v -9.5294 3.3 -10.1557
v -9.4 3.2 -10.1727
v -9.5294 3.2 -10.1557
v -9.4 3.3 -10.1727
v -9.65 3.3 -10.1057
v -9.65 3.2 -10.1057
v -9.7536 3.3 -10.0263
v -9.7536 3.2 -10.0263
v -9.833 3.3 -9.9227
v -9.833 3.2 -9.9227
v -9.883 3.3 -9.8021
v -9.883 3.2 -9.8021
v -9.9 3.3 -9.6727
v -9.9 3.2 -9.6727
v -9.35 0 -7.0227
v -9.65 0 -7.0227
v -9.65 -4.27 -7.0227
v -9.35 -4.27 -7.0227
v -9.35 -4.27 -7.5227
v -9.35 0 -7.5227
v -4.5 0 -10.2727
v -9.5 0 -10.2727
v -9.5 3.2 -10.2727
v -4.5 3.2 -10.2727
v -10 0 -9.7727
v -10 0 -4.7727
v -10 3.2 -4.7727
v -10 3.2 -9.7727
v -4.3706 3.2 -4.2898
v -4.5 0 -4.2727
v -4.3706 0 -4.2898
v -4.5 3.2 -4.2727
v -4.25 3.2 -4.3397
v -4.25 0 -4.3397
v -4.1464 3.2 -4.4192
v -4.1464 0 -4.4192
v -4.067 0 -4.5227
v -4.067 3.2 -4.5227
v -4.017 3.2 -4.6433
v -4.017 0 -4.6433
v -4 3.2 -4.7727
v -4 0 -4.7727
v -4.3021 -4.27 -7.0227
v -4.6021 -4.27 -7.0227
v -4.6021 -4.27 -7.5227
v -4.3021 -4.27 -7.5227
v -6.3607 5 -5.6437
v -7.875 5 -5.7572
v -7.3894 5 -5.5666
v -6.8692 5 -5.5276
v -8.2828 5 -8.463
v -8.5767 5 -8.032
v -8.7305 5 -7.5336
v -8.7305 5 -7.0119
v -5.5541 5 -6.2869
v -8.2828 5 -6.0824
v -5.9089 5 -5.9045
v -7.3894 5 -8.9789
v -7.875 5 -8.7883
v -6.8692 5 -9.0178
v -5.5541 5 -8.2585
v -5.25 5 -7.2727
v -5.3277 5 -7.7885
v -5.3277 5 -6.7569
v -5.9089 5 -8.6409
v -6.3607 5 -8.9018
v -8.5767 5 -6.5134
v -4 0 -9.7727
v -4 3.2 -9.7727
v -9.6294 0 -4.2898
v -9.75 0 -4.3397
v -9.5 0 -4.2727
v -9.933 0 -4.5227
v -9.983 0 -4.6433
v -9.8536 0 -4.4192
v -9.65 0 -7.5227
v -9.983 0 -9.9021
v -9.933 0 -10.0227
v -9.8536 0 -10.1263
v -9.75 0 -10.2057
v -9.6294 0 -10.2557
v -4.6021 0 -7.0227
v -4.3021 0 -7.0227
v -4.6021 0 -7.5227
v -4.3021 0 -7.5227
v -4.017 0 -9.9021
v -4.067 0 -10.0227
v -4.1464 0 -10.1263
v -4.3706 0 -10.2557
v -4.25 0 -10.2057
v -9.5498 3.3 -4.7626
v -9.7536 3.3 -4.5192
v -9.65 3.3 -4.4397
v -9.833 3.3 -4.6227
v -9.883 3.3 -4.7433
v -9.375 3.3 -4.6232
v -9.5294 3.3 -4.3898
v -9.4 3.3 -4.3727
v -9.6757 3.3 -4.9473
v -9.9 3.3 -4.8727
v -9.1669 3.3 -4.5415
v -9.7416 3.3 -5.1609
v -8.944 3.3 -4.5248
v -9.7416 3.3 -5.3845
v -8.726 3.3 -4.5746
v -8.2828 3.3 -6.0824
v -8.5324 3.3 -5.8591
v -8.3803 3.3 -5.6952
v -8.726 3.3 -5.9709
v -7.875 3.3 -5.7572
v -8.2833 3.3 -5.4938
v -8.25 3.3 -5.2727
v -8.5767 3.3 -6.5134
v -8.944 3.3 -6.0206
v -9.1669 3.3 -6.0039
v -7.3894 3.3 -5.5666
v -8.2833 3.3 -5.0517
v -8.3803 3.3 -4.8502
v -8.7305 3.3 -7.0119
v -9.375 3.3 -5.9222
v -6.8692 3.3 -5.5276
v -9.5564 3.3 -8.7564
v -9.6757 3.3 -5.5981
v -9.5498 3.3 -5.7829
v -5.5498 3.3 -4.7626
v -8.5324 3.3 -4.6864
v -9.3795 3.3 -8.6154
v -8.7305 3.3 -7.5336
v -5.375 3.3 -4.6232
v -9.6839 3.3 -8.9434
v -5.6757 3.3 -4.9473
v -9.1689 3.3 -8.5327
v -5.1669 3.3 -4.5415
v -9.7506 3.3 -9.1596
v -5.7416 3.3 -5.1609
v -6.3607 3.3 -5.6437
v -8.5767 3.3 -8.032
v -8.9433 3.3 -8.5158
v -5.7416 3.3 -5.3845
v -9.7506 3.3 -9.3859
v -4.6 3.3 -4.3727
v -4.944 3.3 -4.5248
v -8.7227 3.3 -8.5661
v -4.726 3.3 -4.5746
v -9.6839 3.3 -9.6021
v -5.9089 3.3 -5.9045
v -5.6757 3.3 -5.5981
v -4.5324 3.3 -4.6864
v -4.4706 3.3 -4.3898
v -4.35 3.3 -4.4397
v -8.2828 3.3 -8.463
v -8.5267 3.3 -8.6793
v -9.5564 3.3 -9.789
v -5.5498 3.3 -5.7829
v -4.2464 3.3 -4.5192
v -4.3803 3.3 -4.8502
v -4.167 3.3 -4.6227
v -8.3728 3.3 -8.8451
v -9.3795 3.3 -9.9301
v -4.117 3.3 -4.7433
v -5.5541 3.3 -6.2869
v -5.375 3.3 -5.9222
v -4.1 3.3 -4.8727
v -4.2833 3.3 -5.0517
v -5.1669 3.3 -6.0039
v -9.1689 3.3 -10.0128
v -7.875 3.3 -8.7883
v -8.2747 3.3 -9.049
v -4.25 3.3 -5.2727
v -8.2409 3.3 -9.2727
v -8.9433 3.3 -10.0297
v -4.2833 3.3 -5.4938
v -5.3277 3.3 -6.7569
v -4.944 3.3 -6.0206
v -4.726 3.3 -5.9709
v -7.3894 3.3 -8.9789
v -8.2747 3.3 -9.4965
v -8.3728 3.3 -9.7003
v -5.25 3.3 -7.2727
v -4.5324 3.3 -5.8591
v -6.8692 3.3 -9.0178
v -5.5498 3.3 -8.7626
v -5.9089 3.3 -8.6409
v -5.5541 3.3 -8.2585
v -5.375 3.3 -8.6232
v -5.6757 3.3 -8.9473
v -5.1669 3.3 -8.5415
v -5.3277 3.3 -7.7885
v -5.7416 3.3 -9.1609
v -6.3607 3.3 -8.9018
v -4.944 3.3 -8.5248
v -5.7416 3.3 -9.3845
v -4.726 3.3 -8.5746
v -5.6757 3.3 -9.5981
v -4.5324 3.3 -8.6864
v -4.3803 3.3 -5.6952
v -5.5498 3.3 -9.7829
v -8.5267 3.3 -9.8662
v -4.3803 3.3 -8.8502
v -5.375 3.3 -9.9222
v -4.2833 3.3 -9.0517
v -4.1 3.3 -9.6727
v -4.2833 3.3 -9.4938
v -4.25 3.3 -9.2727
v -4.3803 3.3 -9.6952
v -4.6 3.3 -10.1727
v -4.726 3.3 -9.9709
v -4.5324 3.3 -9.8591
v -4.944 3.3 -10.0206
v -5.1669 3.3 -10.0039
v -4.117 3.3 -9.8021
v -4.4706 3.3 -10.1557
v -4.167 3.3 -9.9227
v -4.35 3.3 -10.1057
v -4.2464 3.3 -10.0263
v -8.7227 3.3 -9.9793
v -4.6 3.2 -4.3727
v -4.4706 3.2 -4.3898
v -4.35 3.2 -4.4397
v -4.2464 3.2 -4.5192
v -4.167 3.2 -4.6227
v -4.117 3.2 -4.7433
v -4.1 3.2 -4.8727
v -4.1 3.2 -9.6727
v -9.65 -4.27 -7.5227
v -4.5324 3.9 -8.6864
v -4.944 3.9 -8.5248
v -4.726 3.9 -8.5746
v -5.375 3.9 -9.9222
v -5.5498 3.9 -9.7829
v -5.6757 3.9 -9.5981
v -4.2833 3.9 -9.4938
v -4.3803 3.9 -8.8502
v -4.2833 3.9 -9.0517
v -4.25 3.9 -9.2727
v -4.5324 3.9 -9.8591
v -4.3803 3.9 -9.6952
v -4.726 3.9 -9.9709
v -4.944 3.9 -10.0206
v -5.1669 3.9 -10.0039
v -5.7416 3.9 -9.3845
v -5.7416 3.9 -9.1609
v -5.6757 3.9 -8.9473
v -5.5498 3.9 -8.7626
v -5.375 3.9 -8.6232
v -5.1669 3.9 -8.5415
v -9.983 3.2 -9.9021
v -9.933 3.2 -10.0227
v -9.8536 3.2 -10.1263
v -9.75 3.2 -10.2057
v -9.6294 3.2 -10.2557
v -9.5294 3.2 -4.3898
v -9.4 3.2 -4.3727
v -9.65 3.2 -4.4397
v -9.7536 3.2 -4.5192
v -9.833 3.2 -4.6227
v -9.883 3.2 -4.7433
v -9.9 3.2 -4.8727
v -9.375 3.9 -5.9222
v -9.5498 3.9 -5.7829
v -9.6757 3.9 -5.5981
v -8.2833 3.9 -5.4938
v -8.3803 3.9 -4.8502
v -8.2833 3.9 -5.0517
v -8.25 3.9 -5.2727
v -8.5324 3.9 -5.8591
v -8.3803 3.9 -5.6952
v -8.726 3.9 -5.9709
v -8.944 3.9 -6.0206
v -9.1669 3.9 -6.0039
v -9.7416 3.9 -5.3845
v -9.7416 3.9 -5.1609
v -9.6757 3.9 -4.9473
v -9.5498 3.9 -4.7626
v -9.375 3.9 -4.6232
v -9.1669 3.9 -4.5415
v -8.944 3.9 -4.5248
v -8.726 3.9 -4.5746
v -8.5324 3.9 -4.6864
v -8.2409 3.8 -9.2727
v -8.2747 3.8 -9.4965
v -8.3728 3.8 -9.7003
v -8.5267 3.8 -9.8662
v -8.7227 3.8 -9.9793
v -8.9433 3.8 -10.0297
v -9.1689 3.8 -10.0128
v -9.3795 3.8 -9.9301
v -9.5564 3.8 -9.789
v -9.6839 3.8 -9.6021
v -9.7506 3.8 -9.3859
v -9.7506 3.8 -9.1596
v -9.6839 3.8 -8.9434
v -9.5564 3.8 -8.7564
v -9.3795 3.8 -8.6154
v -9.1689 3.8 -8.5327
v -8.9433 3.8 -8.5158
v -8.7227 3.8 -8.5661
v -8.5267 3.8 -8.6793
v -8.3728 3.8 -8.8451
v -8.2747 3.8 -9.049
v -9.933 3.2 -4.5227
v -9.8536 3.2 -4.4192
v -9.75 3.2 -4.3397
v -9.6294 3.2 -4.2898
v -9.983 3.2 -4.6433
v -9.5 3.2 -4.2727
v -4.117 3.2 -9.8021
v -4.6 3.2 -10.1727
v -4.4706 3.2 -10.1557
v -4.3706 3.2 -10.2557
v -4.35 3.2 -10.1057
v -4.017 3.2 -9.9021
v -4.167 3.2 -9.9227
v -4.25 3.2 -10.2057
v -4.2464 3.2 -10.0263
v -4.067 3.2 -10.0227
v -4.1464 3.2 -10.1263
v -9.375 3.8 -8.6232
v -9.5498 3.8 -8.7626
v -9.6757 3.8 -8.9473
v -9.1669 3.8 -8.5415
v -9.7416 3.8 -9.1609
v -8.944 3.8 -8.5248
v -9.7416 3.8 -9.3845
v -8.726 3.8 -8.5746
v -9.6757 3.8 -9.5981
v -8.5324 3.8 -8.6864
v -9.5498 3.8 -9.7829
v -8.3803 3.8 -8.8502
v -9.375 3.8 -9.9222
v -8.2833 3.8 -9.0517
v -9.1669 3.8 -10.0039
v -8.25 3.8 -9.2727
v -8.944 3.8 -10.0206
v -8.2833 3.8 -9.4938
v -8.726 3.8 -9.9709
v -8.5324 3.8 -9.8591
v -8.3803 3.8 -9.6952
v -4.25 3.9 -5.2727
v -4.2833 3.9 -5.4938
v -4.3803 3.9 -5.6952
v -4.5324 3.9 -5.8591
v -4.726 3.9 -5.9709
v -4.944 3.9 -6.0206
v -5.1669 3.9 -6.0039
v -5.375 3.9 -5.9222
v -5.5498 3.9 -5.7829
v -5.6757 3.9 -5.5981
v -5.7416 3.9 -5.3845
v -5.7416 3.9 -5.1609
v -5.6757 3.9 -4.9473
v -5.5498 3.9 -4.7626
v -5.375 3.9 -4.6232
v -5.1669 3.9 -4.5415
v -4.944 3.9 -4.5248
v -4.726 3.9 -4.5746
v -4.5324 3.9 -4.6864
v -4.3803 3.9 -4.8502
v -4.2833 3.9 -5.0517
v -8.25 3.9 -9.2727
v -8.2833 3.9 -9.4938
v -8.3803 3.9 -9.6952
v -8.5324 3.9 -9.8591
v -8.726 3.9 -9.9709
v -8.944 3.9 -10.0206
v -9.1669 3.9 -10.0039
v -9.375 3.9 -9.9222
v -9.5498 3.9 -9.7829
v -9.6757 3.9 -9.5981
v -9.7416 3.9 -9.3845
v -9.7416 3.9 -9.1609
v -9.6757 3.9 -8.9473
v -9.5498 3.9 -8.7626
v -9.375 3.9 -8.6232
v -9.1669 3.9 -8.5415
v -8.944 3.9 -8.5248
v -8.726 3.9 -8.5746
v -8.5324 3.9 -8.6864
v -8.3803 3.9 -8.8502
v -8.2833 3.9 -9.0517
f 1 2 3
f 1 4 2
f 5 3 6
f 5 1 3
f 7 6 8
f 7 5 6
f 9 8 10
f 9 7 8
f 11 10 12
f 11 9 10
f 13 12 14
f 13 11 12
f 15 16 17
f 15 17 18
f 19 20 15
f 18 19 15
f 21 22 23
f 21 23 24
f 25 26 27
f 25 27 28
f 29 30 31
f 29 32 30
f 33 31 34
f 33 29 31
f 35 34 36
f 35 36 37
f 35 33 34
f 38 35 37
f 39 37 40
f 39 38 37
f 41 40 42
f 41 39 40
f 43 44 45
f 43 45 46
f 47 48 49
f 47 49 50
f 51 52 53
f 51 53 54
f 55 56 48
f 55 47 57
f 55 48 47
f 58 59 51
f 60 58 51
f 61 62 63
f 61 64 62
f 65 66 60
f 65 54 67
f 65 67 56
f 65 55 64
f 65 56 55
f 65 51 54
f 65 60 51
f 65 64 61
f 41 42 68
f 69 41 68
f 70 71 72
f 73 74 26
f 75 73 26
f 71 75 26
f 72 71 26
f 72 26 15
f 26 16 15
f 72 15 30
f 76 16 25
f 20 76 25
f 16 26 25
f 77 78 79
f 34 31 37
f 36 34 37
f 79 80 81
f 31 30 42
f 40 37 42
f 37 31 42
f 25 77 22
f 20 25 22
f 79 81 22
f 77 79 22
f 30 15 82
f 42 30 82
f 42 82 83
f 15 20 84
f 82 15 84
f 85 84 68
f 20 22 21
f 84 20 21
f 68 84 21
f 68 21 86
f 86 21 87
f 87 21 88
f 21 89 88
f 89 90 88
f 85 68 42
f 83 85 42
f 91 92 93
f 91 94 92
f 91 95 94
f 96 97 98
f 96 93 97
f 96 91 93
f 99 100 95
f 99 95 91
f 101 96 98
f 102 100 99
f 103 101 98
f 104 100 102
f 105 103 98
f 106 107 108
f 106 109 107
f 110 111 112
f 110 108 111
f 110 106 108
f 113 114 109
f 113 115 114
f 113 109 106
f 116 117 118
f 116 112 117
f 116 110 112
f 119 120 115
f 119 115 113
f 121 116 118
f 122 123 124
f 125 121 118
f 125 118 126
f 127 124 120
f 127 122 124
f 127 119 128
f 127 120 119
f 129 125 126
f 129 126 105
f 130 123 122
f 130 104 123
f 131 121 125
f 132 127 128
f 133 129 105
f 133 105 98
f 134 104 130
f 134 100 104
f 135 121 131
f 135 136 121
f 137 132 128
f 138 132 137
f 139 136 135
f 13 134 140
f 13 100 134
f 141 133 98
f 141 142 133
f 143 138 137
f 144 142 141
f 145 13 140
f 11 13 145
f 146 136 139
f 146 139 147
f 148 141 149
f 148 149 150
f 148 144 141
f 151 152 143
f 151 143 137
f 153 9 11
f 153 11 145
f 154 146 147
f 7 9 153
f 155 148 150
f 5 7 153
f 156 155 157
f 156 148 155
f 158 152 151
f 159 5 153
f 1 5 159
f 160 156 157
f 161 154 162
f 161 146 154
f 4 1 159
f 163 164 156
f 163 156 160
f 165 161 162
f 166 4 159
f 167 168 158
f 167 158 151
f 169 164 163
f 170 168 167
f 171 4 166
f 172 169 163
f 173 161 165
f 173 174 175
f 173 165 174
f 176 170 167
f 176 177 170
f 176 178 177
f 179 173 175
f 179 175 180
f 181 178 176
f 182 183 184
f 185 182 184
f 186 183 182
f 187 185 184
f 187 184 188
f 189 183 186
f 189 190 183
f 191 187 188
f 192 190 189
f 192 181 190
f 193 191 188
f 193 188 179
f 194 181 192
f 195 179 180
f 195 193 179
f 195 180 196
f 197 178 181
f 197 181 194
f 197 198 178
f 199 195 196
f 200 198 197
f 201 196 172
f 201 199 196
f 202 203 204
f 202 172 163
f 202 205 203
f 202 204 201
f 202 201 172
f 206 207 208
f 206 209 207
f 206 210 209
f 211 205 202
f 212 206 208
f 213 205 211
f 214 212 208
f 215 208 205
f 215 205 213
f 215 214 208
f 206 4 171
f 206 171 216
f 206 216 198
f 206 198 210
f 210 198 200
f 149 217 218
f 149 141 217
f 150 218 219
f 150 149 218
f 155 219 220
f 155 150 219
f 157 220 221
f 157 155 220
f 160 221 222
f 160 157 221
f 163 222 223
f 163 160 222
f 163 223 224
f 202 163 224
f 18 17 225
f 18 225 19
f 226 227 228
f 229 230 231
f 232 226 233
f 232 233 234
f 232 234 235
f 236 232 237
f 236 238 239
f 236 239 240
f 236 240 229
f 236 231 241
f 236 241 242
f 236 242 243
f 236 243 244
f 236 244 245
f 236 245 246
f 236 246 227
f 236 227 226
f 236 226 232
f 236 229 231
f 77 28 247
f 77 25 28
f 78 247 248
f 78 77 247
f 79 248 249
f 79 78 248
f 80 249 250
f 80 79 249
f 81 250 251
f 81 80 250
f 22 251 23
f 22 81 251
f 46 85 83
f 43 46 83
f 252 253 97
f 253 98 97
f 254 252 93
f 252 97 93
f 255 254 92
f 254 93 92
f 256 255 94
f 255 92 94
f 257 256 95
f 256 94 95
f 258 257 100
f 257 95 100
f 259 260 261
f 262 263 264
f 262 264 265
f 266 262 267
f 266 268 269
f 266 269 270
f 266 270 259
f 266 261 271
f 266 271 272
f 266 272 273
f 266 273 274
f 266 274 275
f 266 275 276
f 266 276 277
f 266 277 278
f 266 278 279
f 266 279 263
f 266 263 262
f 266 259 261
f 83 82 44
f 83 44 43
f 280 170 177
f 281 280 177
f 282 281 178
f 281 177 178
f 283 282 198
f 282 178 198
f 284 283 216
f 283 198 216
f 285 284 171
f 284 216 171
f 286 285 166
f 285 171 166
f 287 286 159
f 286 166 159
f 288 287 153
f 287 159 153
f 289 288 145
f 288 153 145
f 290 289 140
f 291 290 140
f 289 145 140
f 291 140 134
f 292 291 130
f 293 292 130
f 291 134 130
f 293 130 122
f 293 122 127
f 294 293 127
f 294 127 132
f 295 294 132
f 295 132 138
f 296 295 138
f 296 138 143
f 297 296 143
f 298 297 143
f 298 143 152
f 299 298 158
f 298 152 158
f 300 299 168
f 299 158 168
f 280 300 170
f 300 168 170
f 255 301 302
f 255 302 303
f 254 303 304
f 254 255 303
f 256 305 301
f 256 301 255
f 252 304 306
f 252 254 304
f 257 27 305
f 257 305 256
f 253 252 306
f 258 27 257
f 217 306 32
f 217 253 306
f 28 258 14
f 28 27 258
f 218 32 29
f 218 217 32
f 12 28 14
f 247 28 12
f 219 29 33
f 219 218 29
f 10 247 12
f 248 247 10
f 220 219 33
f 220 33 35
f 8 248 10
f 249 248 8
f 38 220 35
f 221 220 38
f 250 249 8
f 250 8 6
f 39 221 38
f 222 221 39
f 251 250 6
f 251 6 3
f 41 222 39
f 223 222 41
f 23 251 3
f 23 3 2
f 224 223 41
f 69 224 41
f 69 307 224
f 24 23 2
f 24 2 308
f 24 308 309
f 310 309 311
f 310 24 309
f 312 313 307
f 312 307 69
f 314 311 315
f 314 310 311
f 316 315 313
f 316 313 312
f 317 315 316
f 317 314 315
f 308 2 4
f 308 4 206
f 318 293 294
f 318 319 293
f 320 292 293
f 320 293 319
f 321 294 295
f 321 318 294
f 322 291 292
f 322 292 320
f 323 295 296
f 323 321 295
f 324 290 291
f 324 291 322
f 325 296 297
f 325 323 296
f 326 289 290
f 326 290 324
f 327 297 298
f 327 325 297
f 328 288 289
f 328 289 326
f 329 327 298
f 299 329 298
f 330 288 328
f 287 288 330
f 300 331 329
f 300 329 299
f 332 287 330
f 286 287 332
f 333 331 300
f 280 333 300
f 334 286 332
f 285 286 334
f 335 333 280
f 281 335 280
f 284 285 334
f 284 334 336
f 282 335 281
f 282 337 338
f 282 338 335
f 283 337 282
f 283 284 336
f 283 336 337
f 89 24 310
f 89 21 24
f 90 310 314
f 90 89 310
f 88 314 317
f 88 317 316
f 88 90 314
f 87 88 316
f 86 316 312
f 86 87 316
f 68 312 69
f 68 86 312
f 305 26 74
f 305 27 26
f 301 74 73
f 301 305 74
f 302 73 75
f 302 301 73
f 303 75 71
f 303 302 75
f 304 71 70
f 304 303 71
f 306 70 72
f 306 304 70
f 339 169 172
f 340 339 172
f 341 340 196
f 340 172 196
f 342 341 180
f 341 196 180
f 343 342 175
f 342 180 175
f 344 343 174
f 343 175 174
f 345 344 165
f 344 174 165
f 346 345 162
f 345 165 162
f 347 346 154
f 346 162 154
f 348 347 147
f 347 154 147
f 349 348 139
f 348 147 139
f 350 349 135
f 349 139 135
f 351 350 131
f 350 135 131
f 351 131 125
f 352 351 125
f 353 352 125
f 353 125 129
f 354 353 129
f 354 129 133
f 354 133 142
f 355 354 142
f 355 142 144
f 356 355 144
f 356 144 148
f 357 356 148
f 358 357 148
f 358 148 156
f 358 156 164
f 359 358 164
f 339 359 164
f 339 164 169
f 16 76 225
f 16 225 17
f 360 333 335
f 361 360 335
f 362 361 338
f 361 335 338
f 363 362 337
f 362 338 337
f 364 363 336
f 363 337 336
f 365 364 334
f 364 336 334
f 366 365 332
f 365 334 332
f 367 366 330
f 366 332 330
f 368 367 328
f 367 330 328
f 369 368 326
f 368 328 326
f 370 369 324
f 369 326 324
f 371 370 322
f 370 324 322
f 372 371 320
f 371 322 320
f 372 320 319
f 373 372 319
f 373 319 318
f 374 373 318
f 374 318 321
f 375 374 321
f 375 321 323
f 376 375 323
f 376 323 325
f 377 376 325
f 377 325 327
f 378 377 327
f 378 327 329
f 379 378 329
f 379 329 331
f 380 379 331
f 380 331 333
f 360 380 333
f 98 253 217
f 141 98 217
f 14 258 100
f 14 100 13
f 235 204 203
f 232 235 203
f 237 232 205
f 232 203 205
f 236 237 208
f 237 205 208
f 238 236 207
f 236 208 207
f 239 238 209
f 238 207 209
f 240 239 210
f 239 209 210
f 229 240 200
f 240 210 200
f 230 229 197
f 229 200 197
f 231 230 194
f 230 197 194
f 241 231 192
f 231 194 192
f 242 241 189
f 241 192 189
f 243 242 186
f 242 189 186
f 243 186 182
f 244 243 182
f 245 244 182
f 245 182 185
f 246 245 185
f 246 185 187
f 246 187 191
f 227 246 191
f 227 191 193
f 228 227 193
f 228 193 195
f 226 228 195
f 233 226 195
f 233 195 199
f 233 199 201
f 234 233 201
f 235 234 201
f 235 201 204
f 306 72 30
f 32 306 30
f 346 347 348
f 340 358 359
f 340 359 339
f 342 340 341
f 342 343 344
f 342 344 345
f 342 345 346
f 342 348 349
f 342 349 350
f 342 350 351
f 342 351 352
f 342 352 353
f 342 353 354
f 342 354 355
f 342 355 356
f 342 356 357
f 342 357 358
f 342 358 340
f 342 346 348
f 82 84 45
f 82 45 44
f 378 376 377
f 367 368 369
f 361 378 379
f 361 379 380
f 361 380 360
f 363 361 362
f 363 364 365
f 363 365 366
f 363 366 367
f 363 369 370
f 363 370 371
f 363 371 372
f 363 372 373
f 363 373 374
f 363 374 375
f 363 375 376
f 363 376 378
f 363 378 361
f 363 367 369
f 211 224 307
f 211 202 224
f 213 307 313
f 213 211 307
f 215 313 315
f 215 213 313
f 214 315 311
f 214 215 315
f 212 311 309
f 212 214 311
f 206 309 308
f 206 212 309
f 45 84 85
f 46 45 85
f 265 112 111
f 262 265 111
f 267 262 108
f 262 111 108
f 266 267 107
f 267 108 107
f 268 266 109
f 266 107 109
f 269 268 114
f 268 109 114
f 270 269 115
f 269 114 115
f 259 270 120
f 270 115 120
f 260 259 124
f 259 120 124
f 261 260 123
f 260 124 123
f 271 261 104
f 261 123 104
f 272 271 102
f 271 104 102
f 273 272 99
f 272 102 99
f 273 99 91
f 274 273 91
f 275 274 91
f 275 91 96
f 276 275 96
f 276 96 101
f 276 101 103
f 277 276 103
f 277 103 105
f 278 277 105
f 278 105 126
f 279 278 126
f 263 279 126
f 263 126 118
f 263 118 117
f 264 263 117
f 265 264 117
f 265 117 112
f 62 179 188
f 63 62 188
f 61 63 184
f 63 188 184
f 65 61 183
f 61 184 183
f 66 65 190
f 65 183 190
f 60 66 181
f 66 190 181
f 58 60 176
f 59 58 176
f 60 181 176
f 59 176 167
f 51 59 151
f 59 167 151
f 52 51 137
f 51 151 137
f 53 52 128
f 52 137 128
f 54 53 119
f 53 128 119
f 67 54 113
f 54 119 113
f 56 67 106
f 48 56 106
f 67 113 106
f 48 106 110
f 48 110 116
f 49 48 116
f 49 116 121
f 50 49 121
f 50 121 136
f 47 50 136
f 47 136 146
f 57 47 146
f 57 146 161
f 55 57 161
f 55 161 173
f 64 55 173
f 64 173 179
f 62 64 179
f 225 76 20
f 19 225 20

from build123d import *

# Parameters (mm, degrees)
ESBO_O1_W                = 6
ESBO_O1_H                = 6
RESSALTO_EXTRUS_O1_DEPTH = 3.4
ESBO_O2_R                = 1.75
RESSALTO_EXTRUS_O2_DEPTH = 1.6
ESBO_O3_R                = 0.75
RESSALTO_EXTRUS_O3_DEPTH = 0.5
ESBO_O5_W                = 0.3
ESBO_O5_H                = 0.5
RESSALTO_EXTRUS_O4_DEPTH = 4.27
ESBO_O6_W                = 6
ESBO_O6_H                = 6
CORTE_EXTRUS_O1_DEPTH    = 0.6
ESBO_O7_W                = 6
ESBO_O7_H                = 6
RESSALTO_EXTRUS_O5_DEPTH = 0.6
ESBO_O9_W                = 6
ESBO_O9_H                = 6
CORTE_EXTRUS_O2_DEPTH    = 0.2
ESBO_O10_W               = 5.8
ESBO_O10_H               = 5.8
RESSALTO_EXTRUS_O6_DEPTH = 0.1
FILETE3_R                = 0.5
FILETE4_R                = 0.5
ESBO_O12_R               = 1.75
ESBO_O12_R_2             = 0.759056116
ESBO_O12_R_3             = 0.75
RESSALTO_EXTRUS_O7_DEPTH = 0.5


with BuildPart() as part:
    # Esboço1 → Ressalto-extrusão1 (new body)
    with BuildSketch(Plane(origin=(0, 0, 0), x_dir=(1, 0, 0), z_dir=(0, 1, 0))):
        with Locations((-7, 7.272727273)):
            Rectangle(ESBO_O1_W, ESBO_O1_H)
    extrude(amount=RESSALTO_EXTRUS_O1_DEPTH)

    # Esboço2 → Ressalto-extrusão2 (add)
    with BuildSketch(Plane(origin=(0, 3.4, 0), x_dir=(1, 0, 0), z_dir=(0, 1, 0))):
        with Locations((-7, 7.272727273)):
            Circle(ESBO_O2_R)
    extrude(amount=RESSALTO_EXTRUS_O2_DEPTH)

    # Esboço3 → Ressalto-extrusão3 (add)
    with BuildSketch(Plane(origin=(0, 3.4, 0), x_dir=(1, 0, 0), z_dir=(0, 1, 0))):
        with Locations((-9, 9.272727273)):
            Circle(ESBO_O3_R)
        with Locations((-5, 9.272727273)):
            Circle(ESBO_O3_R)
        with Locations((-9, 5.272727273)):
            Circle(ESBO_O3_R)
        with Locations((-5, 5.272727273)):
            Circle(ESBO_O3_R)
    extrude(amount=RESSALTO_EXTRUS_O3_DEPTH)

    # Esboço5 → Ressalto-extrusão4 (add)
    with BuildSketch(Plane.XZ):
        with Locations((-9.5, -7.272727273)):
            Rectangle(ESBO_O5_W, ESBO_O5_H)
        with Locations((-4.452085856, -7.272727273)):
            Rectangle(ESBO_O5_W, ESBO_O5_H)
    extrude(amount=RESSALTO_EXTRUS_O4_DEPTH)

    # Esboço6 → Corte-extrusão1 (cut)
    with BuildSketch(Plane(origin=(0, 3.4, 0), x_dir=(1, 0, 0), z_dir=(0, 1, 0))):
        with Locations((-7, 7.272727273)):
            Rectangle(ESBO_O6_W, ESBO_O6_H)
    extrude(amount=-CORTE_EXTRUS_O1_DEPTH, mode=Mode.SUBTRACT)

    # Esboço7 → Ressalto-extrusão5 (add)
    with BuildSketch(Plane(origin=(0, 2.8, 0), x_dir=(1, 0, 0), z_dir=(0, 1, 0))):
        with Locations((-7, 7.272727273)):
            Rectangle(ESBO_O7_W, ESBO_O7_H)
    extrude(amount=RESSALTO_EXTRUS_O5_DEPTH)

    # Esboço9 → Corte-extrusão2 (cut)
    with BuildSketch(Plane(origin=(0, 3.4, 0), x_dir=(1, 0, 0), z_dir=(0, 1, 0))):
        with Locations((-7, 7.272727273)):
            Rectangle(ESBO_O9_W, ESBO_O9_H)
    extrude(amount=-CORTE_EXTRUS_O2_DEPTH, mode=Mode.SUBTRACT)

    # Esboço10 → Ressalto-extrusão6 (add)
    with BuildSketch(Plane(origin=(0, 3.2, 0), x_dir=(1, 0, 0), z_dir=(0, 1, 0))):
        with Locations((-7, 7.272727273)):
            Rectangle(ESBO_O10_W, ESBO_O10_H)
    extrude(amount=RESSALTO_EXTRUS_O6_DEPTH)

    # Filete3
    filete3_edges = [part.edges().sort_by_distance(p)[0] for p in [
        (-9.9, 3.25, -10.172727273),
        (-9.9, 3.25, -4.372727273),
        (-4.1, 3.25, -4.372727273),
        (-4.1, 3.25, -10.172727273),
    ]]
    fillet(filete3_edges, radius=FILETE3_R)

    # Filete4
    filete4_edges = [part.edges().sort_by_distance(p)[0] for p in [
        (-10, 1.6, -10.272727273),
        (-10, 1.6, -4.272727273),
        (-4, 1.6, -4.272727273),
        (-4, 1.6, -10.272727273),
    ]]
    fillet(filete4_edges, radius=FILETE4_R)

    # Esboço12 → Ressalto-extrusão7 (add)
    with BuildSketch(Plane(origin=(0, 3.3, 0), x_dir=(1, 0, 0), z_dir=(0, 1, 0))):
        with Locations((-7, 7.272727273)):
            Circle(ESBO_O12_R)
        with Locations((-9, 9.272727273)):
            Circle(ESBO_O12_R_2)
        with Locations((-5, 9.272727273)):
            Circle(ESBO_O12_R_3)
        with Locations((-5, 5.272727273)):
            Circle(ESBO_O12_R_3)
        with Locations((-9, 5.272727273)):
            Circle(ESBO_O12_R_3)
    extrude(amount=RESSALTO_EXTRUS_O7_DEPTH)


solid = part.part
